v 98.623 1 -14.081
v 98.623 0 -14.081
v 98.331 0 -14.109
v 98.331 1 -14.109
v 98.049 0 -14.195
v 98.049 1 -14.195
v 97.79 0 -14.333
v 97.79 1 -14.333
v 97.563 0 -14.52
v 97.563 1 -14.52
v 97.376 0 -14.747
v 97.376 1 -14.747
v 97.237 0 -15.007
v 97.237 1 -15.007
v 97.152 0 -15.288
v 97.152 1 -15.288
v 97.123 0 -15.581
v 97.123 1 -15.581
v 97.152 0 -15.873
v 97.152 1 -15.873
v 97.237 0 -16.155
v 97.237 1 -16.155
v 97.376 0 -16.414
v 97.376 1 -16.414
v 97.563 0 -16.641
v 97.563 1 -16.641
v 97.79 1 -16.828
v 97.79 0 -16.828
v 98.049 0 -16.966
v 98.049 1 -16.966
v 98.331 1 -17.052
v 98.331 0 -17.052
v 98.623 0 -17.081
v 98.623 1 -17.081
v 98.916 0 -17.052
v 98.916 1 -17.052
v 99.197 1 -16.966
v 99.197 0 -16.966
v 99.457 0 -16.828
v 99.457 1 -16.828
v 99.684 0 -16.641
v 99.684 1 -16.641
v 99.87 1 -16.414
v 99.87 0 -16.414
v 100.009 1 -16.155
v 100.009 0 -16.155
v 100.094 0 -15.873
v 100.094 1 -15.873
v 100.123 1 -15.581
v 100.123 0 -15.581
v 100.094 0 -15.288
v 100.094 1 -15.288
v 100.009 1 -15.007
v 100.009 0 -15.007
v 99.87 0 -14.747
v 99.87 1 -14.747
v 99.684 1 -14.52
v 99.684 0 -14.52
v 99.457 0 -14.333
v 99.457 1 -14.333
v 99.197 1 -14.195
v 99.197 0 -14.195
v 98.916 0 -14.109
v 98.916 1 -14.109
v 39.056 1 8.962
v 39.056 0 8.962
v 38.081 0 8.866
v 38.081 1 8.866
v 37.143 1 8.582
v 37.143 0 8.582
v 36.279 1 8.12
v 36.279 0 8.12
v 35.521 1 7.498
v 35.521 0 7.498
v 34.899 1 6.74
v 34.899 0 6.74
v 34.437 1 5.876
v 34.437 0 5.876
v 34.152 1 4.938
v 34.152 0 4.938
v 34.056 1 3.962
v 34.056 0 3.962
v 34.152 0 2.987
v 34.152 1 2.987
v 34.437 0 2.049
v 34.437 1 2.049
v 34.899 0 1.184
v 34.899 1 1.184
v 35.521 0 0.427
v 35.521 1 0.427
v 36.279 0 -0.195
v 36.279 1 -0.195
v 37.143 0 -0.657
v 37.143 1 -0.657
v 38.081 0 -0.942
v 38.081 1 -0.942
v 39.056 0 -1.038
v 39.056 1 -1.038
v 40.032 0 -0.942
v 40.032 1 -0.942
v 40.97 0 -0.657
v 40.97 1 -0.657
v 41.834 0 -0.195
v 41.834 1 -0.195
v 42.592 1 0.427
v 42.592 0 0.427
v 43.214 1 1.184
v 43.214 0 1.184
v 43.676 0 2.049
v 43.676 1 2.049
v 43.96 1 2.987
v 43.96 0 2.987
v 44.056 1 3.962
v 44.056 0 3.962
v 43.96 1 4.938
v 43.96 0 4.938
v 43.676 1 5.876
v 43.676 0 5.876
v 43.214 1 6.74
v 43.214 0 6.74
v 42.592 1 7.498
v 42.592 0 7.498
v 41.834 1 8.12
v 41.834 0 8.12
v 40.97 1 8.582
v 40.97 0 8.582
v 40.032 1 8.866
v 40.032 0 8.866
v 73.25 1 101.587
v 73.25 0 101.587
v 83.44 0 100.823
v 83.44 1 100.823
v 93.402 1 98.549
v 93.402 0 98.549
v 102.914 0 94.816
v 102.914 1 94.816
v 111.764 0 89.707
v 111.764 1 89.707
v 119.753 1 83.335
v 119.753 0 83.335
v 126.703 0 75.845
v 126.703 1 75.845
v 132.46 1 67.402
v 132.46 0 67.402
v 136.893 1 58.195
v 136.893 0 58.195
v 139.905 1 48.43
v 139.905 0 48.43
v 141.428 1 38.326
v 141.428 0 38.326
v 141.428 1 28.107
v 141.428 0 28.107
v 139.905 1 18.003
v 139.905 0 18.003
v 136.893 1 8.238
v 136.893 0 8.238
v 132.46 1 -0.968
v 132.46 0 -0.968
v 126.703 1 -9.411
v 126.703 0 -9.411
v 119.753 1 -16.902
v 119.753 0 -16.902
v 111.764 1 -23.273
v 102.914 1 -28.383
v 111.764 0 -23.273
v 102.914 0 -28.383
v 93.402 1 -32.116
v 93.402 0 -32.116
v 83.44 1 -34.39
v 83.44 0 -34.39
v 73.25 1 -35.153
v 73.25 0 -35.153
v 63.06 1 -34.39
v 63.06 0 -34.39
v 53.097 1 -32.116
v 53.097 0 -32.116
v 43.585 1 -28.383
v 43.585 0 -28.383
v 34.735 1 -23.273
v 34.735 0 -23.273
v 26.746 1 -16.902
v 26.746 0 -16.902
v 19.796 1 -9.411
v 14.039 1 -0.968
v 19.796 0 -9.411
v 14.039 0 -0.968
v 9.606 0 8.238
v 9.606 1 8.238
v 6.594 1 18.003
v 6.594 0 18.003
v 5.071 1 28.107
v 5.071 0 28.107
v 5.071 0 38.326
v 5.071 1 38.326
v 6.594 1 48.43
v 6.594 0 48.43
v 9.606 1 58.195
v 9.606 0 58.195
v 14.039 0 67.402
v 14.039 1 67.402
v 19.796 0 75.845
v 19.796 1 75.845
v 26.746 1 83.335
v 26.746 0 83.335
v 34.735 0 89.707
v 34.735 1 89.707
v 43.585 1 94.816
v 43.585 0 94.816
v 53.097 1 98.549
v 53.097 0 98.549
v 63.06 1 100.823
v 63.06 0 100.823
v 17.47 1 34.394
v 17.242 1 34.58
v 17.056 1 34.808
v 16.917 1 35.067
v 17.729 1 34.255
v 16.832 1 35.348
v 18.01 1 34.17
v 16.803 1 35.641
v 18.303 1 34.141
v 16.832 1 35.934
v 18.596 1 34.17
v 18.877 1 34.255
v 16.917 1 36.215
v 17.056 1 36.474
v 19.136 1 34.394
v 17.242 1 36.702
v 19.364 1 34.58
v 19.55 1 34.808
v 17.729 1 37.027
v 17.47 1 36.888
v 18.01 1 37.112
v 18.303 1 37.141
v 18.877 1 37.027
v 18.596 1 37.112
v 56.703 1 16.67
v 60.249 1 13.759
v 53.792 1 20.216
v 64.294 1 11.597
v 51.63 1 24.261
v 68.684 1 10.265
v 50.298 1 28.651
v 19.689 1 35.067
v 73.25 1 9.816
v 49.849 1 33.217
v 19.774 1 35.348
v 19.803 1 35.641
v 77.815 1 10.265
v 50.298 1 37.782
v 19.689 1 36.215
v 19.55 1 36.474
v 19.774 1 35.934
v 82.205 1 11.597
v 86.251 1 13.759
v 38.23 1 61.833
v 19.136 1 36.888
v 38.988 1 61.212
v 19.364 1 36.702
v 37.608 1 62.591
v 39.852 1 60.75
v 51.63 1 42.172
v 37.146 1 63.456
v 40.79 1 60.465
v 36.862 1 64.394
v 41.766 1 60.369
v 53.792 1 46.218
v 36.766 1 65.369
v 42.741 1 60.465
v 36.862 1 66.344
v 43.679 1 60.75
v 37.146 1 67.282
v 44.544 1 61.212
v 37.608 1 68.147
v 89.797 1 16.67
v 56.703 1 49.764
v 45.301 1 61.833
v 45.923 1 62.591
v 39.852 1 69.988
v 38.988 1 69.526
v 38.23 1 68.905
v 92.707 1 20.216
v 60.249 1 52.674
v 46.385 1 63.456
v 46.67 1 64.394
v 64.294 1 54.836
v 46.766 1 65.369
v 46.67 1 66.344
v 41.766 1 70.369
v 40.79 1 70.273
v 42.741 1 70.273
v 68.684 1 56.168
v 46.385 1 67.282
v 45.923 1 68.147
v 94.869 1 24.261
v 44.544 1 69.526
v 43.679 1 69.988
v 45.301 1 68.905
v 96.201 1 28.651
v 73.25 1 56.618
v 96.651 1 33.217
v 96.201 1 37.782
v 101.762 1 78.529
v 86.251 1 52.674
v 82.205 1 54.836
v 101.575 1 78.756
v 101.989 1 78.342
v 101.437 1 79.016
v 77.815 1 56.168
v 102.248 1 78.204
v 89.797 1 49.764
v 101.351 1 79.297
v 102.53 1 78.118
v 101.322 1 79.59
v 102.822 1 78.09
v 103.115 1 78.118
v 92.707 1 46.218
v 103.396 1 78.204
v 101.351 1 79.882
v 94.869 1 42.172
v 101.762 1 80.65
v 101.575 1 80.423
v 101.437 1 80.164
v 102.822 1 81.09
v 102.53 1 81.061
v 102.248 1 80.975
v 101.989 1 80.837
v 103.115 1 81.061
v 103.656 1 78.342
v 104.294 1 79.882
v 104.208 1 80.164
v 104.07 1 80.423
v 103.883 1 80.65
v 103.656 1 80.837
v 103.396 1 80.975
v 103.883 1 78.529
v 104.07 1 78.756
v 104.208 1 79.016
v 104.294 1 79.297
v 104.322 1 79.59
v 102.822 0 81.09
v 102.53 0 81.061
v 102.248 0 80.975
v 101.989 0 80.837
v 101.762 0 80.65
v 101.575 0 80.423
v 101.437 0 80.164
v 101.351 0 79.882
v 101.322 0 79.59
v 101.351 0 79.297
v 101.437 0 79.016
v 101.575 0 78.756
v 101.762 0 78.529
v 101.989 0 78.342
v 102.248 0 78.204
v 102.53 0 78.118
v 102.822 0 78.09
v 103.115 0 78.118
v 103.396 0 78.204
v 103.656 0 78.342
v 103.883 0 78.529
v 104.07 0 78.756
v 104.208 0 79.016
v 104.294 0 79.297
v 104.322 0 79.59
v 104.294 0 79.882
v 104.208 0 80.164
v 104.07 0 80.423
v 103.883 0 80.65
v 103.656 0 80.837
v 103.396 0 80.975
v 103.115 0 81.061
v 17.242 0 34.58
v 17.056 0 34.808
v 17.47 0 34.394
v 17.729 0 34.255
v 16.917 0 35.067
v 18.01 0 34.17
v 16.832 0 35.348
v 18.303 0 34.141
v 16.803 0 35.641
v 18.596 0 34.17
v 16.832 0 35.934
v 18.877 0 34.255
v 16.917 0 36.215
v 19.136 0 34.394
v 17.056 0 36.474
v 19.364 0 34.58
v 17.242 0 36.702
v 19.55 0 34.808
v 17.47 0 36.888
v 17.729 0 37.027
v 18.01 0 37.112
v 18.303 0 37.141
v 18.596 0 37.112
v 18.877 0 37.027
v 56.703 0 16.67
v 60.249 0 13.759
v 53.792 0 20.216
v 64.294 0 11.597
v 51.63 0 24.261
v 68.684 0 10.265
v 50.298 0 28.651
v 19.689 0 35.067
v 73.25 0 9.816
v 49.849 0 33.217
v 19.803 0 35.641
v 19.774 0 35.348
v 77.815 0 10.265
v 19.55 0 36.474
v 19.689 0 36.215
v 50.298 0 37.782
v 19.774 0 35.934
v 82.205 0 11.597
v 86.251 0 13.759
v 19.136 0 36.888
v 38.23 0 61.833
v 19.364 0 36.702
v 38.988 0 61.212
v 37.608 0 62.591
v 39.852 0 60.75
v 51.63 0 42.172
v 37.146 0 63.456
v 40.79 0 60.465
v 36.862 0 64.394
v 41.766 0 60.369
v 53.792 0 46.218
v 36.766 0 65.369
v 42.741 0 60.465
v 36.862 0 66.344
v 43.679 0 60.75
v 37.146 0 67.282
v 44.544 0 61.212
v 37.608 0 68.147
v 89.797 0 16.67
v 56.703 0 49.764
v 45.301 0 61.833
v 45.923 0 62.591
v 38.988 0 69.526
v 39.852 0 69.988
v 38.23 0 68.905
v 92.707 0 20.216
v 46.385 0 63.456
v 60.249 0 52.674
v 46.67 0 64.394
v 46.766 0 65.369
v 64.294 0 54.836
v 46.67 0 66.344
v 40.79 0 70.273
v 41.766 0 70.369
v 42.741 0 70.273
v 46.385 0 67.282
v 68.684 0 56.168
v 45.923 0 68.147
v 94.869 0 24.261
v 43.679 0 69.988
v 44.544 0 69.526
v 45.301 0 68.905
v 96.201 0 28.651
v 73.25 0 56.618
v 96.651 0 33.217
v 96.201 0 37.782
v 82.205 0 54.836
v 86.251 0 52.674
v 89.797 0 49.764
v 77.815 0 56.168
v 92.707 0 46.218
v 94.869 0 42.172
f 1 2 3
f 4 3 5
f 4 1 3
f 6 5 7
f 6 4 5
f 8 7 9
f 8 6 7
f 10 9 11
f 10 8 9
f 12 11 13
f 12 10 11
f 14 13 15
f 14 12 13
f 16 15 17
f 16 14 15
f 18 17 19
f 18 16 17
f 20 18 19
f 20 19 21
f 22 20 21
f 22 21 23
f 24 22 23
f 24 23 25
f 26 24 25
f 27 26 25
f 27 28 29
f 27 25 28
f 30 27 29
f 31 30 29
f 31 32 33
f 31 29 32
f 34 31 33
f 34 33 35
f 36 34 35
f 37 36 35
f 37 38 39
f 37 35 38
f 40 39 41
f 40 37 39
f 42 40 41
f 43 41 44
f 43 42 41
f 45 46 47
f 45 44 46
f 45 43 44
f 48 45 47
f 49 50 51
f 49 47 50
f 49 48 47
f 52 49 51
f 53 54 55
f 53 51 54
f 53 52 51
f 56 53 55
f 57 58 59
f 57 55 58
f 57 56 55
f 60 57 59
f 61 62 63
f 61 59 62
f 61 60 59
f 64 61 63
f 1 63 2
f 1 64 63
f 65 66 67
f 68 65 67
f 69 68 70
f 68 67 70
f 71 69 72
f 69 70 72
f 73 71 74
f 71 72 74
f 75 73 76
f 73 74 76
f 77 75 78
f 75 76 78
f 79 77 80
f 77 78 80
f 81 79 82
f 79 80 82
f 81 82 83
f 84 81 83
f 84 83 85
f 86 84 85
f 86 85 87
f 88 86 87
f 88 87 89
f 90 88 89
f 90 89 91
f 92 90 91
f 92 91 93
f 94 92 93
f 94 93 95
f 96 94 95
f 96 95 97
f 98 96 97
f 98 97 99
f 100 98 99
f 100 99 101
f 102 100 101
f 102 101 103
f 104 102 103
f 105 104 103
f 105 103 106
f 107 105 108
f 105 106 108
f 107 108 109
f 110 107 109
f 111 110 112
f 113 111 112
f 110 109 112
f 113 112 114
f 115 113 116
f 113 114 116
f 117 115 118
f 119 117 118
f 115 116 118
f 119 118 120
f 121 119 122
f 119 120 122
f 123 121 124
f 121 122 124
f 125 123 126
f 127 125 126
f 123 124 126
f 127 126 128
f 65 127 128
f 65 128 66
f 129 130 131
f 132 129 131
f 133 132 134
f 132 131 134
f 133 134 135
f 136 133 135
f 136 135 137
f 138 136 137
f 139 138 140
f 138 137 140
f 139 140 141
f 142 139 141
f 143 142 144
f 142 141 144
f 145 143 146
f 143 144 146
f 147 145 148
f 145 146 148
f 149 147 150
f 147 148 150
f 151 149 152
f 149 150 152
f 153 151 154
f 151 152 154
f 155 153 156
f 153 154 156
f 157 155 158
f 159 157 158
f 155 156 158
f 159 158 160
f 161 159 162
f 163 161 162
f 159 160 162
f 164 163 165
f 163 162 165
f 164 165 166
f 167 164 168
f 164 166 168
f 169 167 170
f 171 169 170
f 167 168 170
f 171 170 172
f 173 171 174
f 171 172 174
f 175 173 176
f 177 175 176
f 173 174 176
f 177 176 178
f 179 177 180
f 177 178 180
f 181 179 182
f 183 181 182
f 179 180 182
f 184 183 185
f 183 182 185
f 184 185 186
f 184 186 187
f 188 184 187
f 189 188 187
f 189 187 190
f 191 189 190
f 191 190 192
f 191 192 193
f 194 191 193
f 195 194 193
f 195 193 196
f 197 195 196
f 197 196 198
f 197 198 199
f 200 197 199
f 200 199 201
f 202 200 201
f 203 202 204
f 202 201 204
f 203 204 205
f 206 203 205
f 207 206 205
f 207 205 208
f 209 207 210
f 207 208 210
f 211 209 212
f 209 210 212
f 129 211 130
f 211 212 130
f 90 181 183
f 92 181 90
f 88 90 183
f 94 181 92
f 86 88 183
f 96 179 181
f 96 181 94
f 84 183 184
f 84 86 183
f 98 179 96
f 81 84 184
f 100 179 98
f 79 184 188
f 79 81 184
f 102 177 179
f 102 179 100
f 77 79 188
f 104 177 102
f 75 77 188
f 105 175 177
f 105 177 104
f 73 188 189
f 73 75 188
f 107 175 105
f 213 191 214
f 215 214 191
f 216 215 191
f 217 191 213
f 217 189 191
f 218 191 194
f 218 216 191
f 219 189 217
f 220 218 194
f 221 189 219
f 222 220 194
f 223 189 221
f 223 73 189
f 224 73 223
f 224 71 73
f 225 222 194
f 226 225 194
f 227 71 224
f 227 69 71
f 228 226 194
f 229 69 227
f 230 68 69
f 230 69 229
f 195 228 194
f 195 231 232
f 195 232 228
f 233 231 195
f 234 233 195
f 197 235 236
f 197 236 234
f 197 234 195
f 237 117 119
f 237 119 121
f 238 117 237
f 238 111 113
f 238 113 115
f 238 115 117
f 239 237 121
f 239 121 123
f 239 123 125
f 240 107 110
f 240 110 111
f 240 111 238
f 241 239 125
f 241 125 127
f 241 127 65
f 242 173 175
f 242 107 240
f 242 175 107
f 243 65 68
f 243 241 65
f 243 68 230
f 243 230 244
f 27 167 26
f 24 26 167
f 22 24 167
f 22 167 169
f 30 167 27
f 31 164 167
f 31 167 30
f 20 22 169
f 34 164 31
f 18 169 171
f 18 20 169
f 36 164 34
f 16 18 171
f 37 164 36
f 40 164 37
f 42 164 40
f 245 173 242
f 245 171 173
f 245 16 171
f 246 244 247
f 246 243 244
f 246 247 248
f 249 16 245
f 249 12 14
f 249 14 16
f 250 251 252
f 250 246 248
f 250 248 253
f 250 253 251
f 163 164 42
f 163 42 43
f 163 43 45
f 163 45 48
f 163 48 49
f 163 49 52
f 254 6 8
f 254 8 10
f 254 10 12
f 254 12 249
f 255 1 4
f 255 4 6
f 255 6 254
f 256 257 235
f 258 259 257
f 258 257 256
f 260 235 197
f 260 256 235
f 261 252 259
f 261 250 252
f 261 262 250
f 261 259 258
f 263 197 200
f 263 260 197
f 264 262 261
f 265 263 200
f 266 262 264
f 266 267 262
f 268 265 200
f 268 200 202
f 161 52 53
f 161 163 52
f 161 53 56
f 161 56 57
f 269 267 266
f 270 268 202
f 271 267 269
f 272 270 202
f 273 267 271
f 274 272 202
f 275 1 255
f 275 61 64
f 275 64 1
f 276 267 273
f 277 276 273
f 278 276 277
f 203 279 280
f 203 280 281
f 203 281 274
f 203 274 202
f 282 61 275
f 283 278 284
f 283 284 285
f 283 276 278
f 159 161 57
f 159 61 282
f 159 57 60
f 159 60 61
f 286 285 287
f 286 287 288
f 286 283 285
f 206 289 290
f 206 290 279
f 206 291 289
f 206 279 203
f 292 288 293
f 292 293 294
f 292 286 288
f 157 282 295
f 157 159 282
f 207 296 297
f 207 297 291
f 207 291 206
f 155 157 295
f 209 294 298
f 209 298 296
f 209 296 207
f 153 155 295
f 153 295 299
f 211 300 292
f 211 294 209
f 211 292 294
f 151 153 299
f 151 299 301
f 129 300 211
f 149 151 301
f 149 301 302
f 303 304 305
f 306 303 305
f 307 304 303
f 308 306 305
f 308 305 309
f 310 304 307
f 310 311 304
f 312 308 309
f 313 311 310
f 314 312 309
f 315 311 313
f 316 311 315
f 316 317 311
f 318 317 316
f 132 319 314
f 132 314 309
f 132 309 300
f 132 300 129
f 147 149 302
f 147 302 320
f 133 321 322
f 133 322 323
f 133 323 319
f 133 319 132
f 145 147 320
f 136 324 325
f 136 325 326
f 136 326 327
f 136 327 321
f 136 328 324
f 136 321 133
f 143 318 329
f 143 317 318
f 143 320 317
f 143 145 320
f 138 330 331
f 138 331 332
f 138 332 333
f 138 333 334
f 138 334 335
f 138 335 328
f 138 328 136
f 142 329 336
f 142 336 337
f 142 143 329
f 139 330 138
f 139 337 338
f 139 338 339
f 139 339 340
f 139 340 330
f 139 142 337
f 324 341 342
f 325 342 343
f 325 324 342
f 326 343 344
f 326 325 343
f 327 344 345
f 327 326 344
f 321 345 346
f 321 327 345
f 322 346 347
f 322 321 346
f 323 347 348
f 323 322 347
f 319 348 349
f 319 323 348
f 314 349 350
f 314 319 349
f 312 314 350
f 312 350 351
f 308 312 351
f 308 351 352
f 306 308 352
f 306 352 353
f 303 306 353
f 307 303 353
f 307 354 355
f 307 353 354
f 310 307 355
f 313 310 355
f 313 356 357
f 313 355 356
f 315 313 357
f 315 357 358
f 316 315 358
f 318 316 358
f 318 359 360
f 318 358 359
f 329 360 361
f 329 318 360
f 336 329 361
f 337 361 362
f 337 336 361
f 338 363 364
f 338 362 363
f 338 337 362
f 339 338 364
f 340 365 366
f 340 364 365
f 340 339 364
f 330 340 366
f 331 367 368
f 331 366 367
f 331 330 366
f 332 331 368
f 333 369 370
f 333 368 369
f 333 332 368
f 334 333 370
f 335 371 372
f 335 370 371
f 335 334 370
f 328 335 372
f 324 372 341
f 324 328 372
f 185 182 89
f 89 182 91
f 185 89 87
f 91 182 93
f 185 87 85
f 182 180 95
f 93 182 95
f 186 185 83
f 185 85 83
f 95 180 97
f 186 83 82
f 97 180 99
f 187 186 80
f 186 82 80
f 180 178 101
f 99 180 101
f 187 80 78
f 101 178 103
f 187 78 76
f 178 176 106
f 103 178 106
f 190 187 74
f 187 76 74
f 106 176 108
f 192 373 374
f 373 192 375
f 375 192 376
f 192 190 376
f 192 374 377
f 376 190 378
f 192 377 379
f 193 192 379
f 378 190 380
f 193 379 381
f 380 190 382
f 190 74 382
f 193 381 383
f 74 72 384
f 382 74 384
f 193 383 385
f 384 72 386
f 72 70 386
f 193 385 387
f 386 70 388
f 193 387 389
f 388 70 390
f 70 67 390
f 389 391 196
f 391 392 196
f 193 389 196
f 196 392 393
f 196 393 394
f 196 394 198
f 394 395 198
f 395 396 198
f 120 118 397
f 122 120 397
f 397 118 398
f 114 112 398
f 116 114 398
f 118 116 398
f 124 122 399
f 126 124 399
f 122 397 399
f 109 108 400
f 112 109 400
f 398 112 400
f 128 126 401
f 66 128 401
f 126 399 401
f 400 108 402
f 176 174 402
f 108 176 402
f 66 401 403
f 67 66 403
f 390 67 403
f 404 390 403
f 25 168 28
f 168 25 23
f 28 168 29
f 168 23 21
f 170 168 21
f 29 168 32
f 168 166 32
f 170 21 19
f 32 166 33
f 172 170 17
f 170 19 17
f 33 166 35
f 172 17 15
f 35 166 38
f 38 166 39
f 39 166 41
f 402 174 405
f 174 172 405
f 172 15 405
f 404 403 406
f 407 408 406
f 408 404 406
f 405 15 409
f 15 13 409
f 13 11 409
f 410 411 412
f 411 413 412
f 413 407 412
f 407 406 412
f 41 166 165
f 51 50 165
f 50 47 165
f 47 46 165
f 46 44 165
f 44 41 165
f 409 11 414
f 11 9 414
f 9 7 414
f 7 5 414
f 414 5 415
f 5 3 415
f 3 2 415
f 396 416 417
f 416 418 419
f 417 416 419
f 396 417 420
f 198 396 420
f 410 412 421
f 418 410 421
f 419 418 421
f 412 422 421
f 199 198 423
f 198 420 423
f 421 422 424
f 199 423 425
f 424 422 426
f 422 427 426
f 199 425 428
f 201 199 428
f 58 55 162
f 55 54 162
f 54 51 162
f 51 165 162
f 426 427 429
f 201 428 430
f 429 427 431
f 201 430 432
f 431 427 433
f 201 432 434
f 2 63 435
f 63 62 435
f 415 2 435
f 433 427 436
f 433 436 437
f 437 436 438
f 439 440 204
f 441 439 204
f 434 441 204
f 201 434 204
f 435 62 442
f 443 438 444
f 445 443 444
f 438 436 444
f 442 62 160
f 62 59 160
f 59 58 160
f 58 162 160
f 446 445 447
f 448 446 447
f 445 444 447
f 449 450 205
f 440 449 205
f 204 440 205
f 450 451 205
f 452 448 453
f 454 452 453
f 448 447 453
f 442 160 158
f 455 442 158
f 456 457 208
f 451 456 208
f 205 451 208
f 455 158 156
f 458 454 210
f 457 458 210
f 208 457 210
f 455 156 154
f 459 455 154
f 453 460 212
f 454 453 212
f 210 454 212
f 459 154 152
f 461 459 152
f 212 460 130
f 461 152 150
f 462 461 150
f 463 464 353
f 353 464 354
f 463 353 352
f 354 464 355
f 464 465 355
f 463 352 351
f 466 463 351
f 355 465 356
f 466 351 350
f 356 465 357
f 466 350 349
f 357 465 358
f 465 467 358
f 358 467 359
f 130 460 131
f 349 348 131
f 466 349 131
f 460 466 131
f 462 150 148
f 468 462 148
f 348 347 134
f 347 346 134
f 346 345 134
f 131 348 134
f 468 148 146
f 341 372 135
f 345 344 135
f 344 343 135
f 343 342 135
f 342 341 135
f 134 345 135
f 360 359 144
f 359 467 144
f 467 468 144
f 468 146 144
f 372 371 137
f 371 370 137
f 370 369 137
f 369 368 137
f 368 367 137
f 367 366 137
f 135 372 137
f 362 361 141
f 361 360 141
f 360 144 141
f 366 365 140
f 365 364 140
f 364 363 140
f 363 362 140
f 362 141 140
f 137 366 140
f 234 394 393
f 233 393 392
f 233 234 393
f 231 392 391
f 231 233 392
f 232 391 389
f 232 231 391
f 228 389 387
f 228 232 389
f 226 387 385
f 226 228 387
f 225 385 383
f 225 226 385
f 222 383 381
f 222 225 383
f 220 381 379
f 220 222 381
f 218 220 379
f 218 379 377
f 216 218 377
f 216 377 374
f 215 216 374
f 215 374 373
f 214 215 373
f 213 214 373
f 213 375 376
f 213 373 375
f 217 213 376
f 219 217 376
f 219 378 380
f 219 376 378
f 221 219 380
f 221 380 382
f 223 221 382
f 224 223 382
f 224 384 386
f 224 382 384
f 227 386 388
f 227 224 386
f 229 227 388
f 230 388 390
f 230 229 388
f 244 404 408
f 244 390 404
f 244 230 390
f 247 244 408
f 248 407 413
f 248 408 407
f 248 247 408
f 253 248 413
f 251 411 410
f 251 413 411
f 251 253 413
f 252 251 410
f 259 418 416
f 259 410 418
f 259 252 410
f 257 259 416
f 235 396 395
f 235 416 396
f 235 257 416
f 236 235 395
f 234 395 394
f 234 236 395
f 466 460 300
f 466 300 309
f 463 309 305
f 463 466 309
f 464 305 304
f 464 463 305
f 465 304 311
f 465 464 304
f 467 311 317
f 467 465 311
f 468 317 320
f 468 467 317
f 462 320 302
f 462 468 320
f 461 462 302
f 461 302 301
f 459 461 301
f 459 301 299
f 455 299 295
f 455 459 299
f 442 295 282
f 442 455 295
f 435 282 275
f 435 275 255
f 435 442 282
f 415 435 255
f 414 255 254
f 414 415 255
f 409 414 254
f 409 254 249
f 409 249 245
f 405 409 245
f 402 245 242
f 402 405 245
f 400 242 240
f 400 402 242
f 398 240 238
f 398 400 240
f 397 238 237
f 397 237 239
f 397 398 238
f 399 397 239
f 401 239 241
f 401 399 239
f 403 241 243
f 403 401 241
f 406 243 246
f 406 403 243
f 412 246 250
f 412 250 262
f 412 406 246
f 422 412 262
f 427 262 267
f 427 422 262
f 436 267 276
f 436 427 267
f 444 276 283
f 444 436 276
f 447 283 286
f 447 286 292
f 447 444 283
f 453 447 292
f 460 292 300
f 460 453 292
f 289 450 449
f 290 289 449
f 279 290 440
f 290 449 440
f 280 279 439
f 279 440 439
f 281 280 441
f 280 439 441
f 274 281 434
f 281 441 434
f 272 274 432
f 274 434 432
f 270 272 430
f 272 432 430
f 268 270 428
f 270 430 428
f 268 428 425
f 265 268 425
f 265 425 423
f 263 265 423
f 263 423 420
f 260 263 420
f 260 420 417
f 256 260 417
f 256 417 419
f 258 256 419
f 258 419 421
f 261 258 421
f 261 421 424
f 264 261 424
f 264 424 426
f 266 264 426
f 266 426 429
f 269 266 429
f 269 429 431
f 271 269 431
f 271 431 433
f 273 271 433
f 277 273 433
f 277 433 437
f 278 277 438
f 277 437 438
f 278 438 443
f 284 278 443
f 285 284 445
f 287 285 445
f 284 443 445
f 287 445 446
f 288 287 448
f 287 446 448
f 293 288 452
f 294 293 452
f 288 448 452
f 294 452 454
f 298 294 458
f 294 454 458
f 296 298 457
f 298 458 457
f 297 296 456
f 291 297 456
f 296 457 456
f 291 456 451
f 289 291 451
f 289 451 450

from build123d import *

# Parameters (mm, degrees)
SKETCH1_R           = 68.369999998
SKETCH1_R_2         = 23.401
BOSS_EXTRUDE1_DEPTH = 1
SKETCH2_R           = 1.5
CUT_EXTRUDE1_DEPTH  = 10
SKETCH6_R           = 5
CUT_EXTRUDE2_DEPTH  = 10


with BuildPart() as part:
    # Sketch1 → Boss-Extrude1 (new body)
    with BuildSketch(Plane(origin=(0, 0, 0), x_dir=(-1, 0, 0), z_dir=(0, 1, 0))):
        with Locations(Location((-73.249601195, 33.216650322, 0), (0, 0, 90))):
            Circle(SKETCH1_R)
        with Locations(Location((-73.249601195, 33.216650322, 0), (0, 0, 90))):
            Circle(SKETCH1_R_2, mode=Mode.SUBTRACT)
    extrude(amount=BOSS_EXTRUDE1_DEPTH)

    # Sketch2 → Cut-Extrude1 (cut)
    with BuildSketch(Plane.XZ.offset(-1)):
        with Locations(Location((18.303061139, 35.641054554, 0), (0, 0, 90))):
            Circle(SKETCH2_R)
        with Locations(Location((102.822466876, 79.589547745, 0), (0, 0, 90))):
            Circle(SKETCH2_R)
        with Locations(Location((98.623275569, -15.580651332, 0), (0, 0, 90))):
            Circle(SKETCH2_R)
    extrude(amount=CUT_EXTRUDE1_DEPTH, mode=Mode.SUBTRACT)

    # Sketch6 → Cut-Extrude2 (cut)
    with BuildSketch(Plane(origin=(47.341973048, -2, 109.358916756), x_dir=(0.09761667308977556, 0, 0.995224087899245), z_dir=(0, -1, 0))):
        with Locations(Location((-105.702188225, -2.042468777, 0), (0, 0, 5.601944352))):
            Circle(SKETCH6_R)
        with Locations(Location((-44.324158759, 1.255349618, 0), (0, 0, 5.601944352))):
            Circle(SKETCH6_R)
    extrude(amount=-CUT_EXTRUDE2_DEPTH, mode=Mode.SUBTRACT)


solid = part.part
